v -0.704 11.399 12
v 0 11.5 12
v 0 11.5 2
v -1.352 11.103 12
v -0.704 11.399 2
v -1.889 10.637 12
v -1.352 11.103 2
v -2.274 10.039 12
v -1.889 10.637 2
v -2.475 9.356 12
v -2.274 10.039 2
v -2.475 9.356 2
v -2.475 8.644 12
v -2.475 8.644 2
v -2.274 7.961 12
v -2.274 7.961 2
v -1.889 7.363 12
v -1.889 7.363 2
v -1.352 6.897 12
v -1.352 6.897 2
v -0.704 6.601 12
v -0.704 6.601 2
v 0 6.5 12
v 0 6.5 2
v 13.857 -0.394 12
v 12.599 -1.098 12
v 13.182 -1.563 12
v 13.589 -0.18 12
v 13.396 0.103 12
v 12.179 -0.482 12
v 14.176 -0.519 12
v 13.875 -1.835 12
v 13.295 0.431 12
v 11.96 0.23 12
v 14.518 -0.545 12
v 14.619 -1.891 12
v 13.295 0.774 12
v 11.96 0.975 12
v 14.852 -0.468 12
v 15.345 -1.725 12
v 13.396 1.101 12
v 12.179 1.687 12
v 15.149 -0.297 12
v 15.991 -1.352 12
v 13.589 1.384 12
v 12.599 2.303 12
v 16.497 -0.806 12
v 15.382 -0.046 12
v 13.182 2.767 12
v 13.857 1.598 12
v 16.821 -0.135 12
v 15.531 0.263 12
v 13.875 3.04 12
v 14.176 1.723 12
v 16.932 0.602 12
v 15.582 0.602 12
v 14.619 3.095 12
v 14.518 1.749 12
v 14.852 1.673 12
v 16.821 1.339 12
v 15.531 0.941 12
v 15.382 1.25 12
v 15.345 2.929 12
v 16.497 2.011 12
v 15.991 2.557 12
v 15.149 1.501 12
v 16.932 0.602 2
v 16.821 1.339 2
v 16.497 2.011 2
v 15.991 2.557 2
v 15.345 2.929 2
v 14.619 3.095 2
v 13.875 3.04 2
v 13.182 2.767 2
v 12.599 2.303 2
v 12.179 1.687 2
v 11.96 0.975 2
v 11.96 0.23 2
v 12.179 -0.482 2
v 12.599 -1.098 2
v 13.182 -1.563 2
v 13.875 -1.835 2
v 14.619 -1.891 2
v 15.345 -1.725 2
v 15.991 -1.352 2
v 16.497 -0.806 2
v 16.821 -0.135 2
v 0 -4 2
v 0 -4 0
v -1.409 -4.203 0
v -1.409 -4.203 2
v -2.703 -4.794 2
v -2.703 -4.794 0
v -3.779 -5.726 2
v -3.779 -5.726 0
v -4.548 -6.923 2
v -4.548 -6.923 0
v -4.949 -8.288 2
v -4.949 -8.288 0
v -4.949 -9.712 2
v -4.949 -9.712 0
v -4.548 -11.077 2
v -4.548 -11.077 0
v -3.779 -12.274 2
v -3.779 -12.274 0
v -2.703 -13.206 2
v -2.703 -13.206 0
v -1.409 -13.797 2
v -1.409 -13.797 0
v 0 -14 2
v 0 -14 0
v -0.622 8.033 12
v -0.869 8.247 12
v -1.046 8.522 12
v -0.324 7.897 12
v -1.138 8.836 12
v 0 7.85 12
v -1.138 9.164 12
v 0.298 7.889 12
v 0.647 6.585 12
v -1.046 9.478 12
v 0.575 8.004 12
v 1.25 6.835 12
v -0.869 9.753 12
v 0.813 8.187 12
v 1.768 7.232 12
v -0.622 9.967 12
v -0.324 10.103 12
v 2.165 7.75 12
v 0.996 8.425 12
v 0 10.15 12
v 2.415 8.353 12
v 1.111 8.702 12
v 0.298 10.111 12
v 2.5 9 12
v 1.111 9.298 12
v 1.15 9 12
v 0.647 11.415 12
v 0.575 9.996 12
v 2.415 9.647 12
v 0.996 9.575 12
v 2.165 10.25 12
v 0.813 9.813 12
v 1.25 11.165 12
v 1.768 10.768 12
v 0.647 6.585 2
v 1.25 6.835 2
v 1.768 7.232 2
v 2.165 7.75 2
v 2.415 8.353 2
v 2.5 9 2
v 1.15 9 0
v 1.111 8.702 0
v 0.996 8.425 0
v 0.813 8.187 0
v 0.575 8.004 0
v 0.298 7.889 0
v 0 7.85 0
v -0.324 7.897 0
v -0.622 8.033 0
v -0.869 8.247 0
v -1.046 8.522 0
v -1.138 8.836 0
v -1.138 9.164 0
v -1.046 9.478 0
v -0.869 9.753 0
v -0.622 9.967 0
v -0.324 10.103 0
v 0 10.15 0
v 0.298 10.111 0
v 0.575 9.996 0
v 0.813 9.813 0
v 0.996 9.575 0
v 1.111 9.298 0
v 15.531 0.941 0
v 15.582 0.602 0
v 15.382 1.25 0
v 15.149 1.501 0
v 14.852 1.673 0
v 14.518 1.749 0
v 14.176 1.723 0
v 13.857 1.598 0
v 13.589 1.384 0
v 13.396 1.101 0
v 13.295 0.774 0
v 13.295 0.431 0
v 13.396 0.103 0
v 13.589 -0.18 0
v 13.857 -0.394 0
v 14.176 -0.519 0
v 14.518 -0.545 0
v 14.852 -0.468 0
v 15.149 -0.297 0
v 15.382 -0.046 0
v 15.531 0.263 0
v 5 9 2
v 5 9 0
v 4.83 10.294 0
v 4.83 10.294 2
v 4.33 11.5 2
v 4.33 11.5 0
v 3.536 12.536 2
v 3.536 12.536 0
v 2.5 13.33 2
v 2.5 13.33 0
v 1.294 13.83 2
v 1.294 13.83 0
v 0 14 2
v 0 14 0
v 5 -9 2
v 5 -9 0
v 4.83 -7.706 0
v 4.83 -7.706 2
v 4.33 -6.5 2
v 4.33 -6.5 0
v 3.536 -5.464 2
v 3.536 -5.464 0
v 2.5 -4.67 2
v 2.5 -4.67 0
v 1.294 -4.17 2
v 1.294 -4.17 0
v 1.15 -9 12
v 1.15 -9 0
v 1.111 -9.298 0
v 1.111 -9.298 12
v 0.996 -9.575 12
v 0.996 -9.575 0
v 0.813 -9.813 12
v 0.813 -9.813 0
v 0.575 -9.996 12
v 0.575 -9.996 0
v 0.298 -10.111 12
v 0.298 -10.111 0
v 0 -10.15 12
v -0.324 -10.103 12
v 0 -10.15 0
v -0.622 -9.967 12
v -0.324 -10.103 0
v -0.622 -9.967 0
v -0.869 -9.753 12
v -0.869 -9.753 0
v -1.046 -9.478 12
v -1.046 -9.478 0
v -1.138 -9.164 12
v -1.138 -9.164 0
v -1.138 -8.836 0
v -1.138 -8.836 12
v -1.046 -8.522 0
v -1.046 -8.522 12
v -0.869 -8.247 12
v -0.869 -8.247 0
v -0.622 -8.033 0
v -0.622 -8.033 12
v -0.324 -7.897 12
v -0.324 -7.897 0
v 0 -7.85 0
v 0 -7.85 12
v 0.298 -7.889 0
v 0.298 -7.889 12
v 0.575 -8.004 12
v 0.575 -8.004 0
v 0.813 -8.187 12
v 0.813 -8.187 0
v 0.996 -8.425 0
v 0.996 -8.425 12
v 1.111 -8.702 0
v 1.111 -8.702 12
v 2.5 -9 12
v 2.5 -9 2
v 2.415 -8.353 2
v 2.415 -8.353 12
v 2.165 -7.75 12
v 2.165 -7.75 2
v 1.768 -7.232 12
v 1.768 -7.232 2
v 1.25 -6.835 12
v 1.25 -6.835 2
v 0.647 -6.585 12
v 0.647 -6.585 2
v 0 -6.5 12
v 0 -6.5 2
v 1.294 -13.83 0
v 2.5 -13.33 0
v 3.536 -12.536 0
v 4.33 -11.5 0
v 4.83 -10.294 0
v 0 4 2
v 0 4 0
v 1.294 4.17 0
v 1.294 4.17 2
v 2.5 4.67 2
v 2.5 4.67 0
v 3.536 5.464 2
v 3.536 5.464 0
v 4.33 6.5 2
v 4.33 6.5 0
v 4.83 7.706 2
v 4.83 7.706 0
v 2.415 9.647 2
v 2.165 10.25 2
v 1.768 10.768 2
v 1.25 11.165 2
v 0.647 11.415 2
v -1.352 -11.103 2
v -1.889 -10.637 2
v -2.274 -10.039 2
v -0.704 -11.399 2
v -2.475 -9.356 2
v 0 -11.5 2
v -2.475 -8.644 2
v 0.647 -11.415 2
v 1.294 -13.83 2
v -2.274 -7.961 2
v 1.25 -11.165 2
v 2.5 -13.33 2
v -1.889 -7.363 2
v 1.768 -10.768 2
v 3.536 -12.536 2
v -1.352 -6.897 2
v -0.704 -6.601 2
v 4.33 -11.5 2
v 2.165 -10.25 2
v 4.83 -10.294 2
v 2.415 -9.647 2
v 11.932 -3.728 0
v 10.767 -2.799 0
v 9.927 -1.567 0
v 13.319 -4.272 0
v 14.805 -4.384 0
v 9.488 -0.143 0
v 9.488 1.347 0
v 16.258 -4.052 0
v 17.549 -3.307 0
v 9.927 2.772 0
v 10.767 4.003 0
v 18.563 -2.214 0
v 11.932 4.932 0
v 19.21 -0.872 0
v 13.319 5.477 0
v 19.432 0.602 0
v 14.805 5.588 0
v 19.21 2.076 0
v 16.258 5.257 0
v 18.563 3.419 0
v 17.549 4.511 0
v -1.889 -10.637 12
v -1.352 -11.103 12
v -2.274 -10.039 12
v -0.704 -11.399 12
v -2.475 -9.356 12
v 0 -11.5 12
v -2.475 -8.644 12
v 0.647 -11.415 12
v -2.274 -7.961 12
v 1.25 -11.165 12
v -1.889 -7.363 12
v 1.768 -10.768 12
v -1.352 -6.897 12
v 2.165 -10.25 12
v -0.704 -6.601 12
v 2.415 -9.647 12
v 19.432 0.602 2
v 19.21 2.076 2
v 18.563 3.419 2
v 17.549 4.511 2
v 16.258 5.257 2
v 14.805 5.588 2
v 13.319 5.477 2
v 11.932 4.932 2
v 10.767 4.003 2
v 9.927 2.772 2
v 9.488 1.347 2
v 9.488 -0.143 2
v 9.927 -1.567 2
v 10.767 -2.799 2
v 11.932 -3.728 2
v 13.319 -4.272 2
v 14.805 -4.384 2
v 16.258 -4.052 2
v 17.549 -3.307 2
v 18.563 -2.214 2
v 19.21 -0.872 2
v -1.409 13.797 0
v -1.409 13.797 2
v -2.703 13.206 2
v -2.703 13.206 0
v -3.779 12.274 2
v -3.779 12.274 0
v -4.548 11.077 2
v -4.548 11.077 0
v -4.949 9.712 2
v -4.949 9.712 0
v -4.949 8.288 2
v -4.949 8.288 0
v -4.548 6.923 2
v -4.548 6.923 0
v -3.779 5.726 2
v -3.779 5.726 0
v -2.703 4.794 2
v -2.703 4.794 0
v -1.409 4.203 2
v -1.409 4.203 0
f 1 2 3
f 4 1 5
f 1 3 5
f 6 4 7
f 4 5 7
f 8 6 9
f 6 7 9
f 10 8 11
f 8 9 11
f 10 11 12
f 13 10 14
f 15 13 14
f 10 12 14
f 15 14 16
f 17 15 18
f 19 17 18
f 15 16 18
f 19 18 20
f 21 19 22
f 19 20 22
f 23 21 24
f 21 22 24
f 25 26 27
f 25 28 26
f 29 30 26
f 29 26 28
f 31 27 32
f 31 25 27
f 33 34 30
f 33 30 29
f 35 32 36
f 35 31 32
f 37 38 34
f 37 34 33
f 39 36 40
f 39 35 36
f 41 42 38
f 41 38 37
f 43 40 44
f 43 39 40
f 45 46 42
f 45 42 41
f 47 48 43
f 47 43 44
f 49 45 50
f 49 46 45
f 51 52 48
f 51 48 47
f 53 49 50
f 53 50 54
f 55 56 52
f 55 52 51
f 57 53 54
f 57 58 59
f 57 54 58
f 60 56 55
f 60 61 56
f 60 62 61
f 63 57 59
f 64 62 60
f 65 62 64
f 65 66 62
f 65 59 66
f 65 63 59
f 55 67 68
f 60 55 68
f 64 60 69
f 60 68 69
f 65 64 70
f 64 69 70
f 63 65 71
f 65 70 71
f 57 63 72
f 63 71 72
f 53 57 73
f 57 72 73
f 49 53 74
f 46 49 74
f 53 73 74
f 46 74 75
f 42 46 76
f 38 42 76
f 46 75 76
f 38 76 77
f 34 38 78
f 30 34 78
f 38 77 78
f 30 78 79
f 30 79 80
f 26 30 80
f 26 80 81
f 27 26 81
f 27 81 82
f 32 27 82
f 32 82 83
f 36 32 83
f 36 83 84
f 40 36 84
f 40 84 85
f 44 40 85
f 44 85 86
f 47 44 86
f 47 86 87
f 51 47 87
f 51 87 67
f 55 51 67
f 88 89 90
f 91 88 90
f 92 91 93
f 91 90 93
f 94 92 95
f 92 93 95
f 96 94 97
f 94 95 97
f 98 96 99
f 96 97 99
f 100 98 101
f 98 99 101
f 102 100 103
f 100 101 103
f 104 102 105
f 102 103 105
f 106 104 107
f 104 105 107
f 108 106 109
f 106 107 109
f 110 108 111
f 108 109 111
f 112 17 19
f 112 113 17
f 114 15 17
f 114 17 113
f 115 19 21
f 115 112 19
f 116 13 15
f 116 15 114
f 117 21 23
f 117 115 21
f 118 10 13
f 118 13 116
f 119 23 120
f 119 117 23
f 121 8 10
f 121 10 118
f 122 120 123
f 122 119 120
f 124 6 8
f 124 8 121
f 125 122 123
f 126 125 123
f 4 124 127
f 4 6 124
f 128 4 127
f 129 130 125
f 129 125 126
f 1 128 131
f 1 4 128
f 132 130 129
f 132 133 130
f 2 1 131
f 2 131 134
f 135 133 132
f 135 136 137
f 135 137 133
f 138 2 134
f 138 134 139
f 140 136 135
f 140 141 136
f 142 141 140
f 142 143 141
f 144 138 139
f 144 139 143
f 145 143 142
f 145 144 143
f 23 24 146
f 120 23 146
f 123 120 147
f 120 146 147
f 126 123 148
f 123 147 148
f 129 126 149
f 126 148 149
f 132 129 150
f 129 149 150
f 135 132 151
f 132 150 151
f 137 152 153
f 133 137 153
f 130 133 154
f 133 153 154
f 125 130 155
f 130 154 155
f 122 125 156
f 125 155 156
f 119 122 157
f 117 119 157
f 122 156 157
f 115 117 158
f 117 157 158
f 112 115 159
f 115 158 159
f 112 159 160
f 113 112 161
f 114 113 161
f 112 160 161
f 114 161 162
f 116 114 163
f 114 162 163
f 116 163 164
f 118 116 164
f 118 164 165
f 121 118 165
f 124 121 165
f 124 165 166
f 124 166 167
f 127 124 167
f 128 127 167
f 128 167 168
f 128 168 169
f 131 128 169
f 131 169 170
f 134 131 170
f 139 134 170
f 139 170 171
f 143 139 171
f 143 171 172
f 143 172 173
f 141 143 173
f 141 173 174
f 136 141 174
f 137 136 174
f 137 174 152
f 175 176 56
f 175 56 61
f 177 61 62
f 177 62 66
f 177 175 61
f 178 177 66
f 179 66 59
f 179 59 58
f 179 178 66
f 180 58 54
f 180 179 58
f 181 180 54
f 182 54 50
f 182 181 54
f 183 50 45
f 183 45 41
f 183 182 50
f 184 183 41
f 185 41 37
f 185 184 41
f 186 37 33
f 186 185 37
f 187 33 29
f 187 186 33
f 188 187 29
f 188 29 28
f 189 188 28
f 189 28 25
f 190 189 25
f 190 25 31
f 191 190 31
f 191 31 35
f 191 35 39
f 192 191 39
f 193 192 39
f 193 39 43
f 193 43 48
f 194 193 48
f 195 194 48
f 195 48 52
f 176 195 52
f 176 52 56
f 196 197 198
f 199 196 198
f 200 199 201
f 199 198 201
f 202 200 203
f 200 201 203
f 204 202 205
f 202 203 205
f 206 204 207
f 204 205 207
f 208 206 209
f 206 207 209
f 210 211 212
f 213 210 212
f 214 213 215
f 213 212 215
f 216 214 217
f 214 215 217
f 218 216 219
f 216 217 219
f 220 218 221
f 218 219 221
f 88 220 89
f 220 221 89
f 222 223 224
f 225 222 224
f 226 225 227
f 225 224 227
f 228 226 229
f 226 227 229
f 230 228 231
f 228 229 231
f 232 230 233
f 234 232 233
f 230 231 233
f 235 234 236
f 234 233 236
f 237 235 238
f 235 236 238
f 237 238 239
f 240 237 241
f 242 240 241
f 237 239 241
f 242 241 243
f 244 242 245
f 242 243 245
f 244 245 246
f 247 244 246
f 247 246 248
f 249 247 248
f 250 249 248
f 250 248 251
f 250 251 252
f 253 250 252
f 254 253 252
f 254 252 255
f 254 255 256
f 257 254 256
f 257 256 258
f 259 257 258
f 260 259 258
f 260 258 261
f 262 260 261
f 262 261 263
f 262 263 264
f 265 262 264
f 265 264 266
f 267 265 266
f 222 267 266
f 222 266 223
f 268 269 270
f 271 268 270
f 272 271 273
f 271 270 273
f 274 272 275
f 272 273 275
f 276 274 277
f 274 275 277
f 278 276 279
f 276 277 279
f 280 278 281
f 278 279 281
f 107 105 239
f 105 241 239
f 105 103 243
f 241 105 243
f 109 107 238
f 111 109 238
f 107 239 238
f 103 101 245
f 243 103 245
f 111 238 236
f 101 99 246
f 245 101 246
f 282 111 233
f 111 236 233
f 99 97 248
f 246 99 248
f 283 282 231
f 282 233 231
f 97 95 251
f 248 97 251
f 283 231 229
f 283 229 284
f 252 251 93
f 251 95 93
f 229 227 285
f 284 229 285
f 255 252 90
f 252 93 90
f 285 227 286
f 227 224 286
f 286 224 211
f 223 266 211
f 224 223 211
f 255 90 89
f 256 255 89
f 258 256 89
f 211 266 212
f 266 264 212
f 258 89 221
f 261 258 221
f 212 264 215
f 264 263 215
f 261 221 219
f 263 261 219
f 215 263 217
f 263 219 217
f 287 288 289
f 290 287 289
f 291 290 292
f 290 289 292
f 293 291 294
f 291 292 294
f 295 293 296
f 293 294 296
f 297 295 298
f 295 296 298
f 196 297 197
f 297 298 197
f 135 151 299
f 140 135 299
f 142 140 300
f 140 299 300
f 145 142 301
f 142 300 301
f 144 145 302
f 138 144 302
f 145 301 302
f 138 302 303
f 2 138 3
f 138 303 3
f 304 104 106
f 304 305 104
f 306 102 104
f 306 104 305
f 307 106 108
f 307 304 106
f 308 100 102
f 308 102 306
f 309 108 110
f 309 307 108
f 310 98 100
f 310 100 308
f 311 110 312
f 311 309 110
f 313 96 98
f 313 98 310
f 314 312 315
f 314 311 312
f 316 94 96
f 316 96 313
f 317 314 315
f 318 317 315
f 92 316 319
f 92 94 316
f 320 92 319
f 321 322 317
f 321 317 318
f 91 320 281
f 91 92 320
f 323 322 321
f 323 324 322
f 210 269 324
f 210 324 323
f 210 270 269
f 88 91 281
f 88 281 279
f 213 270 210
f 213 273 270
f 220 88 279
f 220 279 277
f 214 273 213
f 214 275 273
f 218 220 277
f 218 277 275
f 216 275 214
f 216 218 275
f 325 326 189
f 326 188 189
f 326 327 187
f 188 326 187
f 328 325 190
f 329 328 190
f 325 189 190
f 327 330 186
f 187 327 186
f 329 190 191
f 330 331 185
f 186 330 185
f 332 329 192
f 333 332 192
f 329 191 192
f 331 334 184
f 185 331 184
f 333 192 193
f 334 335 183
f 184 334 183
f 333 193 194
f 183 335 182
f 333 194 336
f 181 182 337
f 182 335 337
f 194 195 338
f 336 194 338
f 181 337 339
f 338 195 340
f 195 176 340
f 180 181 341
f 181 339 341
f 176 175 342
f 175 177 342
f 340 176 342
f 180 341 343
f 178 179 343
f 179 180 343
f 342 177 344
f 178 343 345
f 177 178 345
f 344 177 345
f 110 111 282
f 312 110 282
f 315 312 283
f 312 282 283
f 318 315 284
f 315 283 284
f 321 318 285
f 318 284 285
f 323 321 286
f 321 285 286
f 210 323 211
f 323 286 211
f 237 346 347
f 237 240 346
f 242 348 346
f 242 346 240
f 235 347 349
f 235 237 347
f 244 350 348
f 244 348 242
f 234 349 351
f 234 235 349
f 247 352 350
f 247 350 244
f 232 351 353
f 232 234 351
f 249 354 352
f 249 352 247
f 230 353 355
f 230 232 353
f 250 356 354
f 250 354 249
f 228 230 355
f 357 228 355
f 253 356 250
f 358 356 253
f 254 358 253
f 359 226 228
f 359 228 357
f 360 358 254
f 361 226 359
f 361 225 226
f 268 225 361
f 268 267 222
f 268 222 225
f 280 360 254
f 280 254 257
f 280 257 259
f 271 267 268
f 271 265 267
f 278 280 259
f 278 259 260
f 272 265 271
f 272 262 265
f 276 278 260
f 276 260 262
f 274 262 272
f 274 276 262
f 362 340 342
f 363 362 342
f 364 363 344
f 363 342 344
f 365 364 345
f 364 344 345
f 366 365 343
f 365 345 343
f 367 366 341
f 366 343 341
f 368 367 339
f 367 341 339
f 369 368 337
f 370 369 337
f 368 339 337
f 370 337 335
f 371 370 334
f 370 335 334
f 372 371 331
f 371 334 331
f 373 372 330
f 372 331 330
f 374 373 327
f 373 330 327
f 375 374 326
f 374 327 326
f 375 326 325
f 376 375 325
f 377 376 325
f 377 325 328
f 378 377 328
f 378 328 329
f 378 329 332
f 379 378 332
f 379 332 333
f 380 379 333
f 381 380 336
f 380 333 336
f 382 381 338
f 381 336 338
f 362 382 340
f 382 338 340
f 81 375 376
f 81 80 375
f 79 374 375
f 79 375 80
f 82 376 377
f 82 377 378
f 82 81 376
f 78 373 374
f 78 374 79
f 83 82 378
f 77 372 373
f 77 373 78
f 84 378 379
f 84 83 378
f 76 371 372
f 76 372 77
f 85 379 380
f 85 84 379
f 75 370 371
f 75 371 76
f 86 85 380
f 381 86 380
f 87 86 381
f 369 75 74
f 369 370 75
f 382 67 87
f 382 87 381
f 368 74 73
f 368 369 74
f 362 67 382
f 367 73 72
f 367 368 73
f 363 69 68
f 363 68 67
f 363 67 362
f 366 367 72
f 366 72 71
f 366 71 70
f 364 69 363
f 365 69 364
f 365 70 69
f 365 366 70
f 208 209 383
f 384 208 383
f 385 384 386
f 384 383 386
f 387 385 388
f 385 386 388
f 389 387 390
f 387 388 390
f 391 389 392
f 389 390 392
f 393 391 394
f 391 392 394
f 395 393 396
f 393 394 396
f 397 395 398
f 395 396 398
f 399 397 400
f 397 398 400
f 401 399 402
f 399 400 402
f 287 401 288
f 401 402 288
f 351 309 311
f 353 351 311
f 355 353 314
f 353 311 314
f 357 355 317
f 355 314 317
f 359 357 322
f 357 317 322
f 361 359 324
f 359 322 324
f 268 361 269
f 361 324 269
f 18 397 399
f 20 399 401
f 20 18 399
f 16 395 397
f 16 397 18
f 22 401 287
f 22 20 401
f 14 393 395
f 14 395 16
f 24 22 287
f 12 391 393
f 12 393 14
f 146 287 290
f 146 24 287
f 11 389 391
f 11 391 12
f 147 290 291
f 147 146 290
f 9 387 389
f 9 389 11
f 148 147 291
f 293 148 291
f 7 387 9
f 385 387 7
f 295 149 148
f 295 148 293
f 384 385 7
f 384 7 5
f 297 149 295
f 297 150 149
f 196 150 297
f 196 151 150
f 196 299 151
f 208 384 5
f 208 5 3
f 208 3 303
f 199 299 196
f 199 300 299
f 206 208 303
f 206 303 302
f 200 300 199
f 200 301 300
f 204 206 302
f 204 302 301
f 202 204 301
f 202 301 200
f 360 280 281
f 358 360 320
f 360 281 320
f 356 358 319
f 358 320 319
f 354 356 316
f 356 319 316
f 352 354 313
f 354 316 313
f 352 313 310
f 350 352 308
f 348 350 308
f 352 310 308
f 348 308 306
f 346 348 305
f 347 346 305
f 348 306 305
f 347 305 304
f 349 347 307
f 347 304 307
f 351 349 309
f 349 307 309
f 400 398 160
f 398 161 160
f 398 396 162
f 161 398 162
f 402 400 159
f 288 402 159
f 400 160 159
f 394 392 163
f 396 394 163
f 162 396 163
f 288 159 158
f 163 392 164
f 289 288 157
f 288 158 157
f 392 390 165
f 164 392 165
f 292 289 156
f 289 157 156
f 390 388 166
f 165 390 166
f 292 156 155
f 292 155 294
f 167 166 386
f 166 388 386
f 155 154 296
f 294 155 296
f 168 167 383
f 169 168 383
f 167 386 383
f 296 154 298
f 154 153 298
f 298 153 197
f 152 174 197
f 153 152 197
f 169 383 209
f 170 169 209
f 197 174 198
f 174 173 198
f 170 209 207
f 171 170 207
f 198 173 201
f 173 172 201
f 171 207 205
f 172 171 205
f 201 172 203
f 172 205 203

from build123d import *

# Parameters (mm, degrees)
F1_DEPTH = 2
F0_R     = 5
F0_R_2   = 2.5
F0_R_3   = 1.15
F2_DEPTH = 12


with BuildPart() as f1:
    # F0 (on Top) → F1 (new body)
    with BuildSketch(Plane.XY):
        with BuildLine():
            ThreePointArc((0, -4), (-5, -9), (0, -14))
            Line((0, -14), (0, -11.5))
            ThreePointArc((0, -11.5), (-2.5, -9), (0, -6.5))
            Line((0, -6.5), (0, -4))
        make_face()
        with BuildLine():
            Line((0, -11.5), (0, -14))
            ThreePointArc((0, -14), (3.5355339059, -12.5355339059), (5, -9))
            ThreePointArc((5, -9), (3.5355339059, -5.4644660941), (0, -4))
            Line((0, -4), (0, -6.5))
            ThreePointArc((0, -6.5), (1.767766953, -7.232233047), (2.5, -9))
            ThreePointArc((2.5, -9), (1.767766953, -10.767766953), (0, -11.5))
        make_face()
        with BuildLine():
            ThreePointArc((0, -6.5), (-2.5, -9), (0, -11.5))
            Line((0, -11.5), (0, -10.15))
            ThreePointArc((0, -10.15), (-1.15, -9), (0, -7.85))
            Line((0, -7.85), (0, -6.5))
        make_face()
        with BuildLine():
            Line((0, -10.15), (0, -11.5))
            ThreePointArc((0, -11.5), (1.767766953, -10.767766953), (2.5, -9))
            ThreePointArc((2.5, -9), (1.767766953, -7.232233047), (0, -6.5))
            Line((0, -6.5), (0, -7.85))
            ThreePointArc((0, -7.85), (0.8131727984, -8.1868272016), (1.15, -9))
            ThreePointArc((1.15, -9), (0.8131727984, -9.8131727984), (0, -10.15))
        make_face()
    extrude(amount=F1_DEPTH)

    # F0 (on Top) → F2 (join)
    with BuildSketch(Plane.XY):
        with BuildLine():
            ThreePointArc((0, -6.5), (-2.5, -9), (0, -11.5))
            Line((0, -11.5), (0, -10.15))
            ThreePointArc((0, -10.15), (-1.15, -9), (0, -7.85))
            Line((0, -7.85), (0, -6.5))
        make_face()
        with BuildLine():
            Line((0, -10.15), (0, -11.5))
            ThreePointArc((0, -11.5), (1.767766953, -10.767766953), (2.5, -9))
            ThreePointArc((2.5, -9), (1.767766953, -7.232233047), (0, -6.5))
            Line((0, -6.5), (0, -7.85))
            ThreePointArc((0, -7.85), (0.8131727984, -8.1868272016), (1.15, -9))
            ThreePointArc((1.15, -9), (0.8131727984, -9.8131727984), (0, -10.15))
        make_face()
    extrude(amount=F2_DEPTH)


with BuildPart() as f1b:
    # F0 (on Top) → F1, piece 2 (new body)
    with BuildSketch(Plane.XY):
        with BuildLine():
            ThreePointArc((0, 14), (-5, 9), (0, 4))
            Line((0, 4), (0, 6.5))
            ThreePointArc((0, 6.5), (-2.5, 9), (0, 11.5))
            Line((0, 11.5), (0, 14))
        make_face()
        with BuildLine():
            Line((0, 6.5), (0, 4))
            ThreePointArc((0, 4), (3.5355339059, 5.4644660941), (5, 9))
            ThreePointArc((5, 9), (3.5355339059, 12.5355339059), (0, 14))
            Line((0, 14), (0, 11.5))
            ThreePointArc((0, 11.5), (1.767766953, 10.767766953), (2.5, 9))
            ThreePointArc((2.5, 9), (1.767766953, 7.232233047), (0, 6.5))
        make_face()
        with BuildLine():
            ThreePointArc((0, 11.5), (-2.5, 9), (0, 6.5))
            Line((0, 6.5), (0, 7.85))
            ThreePointArc((0, 7.85), (-1.15, 9), (0, 10.15))
            Line((0, 10.15), (0, 11.5))
        make_face()
        with BuildLine():
            Line((0, 7.85), (0, 6.5))
            ThreePointArc((0, 6.5), (1.767766953, 7.232233047), (2.5, 9))
            ThreePointArc((2.5, 9), (1.767766953, 10.767766953), (0, 11.5))
            Line((0, 11.5), (0, 10.15))
            ThreePointArc((0, 10.15), (0.8131727984, 9.8131727984), (1.15, 9))
            ThreePointArc((1.15, 9), (0.8131727984, 8.1868272016), (0, 7.85))
        make_face()
    extrude(amount=F1_DEPTH)

    # F0 (on Top) → F2, piece 2 (join)
    with BuildSketch(Plane.XY):
        with BuildLine():
            ThreePointArc((0, 11.5), (-2.5, 9), (0, 6.5))
            Line((0, 6.5), (0, 7.85))
            ThreePointArc((0, 7.85), (-1.15, 9), (0, 10.15))
            Line((0, 10.15), (0, 11.5))
        make_face()
        with BuildLine():
            Line((0, 7.85), (0, 6.5))
            ThreePointArc((0, 6.5), (1.767766953, 7.232233047), (2.5, 9))
            ThreePointArc((2.5, 9), (1.767766953, 10.767766953), (0, 11.5))
            Line((0, 11.5), (0, 10.15))
            ThreePointArc((0, 10.15), (0.8131727984, 9.8131727984), (1.15, 9))
            ThreePointArc((1.15, 9), (0.8131727984, 8.1868272016), (0, 7.85))
        make_face()
    extrude(amount=F2_DEPTH)


with BuildPart() as f1c:
    # F0 (on Top) → F1, piece 3 (new body)
    with BuildSketch(Plane.XY):
        with Locations((14.4317867234, 0.602257438)):
            Circle(F0_R)
        with Locations((14.4317867234, 0.602257438)):
            Circle(F0_R_2, mode=Mode.SUBTRACT)
        with Locations((14.4317867234, 0.602257438)):
            Circle(F0_R_2)
        with Locations((14.4317867234, 0.602257438)):
            Circle(F0_R_3, mode=Mode.SUBTRACT)
    extrude(amount=F1_DEPTH)

    # F0 (on Top) → F2, piece 3 (join)
    with BuildSketch(Plane.XY):
        with Locations((14.4317867234, 0.602257438)):
            Circle(F0_R_2)
        with Locations((14.4317867234, 0.602257438)):
            Circle(F0_R_3, mode=Mode.SUBTRACT)
    extrude(amount=F2_DEPTH)


solid = Compound([f1.part, f1b.part, f1c.part])
